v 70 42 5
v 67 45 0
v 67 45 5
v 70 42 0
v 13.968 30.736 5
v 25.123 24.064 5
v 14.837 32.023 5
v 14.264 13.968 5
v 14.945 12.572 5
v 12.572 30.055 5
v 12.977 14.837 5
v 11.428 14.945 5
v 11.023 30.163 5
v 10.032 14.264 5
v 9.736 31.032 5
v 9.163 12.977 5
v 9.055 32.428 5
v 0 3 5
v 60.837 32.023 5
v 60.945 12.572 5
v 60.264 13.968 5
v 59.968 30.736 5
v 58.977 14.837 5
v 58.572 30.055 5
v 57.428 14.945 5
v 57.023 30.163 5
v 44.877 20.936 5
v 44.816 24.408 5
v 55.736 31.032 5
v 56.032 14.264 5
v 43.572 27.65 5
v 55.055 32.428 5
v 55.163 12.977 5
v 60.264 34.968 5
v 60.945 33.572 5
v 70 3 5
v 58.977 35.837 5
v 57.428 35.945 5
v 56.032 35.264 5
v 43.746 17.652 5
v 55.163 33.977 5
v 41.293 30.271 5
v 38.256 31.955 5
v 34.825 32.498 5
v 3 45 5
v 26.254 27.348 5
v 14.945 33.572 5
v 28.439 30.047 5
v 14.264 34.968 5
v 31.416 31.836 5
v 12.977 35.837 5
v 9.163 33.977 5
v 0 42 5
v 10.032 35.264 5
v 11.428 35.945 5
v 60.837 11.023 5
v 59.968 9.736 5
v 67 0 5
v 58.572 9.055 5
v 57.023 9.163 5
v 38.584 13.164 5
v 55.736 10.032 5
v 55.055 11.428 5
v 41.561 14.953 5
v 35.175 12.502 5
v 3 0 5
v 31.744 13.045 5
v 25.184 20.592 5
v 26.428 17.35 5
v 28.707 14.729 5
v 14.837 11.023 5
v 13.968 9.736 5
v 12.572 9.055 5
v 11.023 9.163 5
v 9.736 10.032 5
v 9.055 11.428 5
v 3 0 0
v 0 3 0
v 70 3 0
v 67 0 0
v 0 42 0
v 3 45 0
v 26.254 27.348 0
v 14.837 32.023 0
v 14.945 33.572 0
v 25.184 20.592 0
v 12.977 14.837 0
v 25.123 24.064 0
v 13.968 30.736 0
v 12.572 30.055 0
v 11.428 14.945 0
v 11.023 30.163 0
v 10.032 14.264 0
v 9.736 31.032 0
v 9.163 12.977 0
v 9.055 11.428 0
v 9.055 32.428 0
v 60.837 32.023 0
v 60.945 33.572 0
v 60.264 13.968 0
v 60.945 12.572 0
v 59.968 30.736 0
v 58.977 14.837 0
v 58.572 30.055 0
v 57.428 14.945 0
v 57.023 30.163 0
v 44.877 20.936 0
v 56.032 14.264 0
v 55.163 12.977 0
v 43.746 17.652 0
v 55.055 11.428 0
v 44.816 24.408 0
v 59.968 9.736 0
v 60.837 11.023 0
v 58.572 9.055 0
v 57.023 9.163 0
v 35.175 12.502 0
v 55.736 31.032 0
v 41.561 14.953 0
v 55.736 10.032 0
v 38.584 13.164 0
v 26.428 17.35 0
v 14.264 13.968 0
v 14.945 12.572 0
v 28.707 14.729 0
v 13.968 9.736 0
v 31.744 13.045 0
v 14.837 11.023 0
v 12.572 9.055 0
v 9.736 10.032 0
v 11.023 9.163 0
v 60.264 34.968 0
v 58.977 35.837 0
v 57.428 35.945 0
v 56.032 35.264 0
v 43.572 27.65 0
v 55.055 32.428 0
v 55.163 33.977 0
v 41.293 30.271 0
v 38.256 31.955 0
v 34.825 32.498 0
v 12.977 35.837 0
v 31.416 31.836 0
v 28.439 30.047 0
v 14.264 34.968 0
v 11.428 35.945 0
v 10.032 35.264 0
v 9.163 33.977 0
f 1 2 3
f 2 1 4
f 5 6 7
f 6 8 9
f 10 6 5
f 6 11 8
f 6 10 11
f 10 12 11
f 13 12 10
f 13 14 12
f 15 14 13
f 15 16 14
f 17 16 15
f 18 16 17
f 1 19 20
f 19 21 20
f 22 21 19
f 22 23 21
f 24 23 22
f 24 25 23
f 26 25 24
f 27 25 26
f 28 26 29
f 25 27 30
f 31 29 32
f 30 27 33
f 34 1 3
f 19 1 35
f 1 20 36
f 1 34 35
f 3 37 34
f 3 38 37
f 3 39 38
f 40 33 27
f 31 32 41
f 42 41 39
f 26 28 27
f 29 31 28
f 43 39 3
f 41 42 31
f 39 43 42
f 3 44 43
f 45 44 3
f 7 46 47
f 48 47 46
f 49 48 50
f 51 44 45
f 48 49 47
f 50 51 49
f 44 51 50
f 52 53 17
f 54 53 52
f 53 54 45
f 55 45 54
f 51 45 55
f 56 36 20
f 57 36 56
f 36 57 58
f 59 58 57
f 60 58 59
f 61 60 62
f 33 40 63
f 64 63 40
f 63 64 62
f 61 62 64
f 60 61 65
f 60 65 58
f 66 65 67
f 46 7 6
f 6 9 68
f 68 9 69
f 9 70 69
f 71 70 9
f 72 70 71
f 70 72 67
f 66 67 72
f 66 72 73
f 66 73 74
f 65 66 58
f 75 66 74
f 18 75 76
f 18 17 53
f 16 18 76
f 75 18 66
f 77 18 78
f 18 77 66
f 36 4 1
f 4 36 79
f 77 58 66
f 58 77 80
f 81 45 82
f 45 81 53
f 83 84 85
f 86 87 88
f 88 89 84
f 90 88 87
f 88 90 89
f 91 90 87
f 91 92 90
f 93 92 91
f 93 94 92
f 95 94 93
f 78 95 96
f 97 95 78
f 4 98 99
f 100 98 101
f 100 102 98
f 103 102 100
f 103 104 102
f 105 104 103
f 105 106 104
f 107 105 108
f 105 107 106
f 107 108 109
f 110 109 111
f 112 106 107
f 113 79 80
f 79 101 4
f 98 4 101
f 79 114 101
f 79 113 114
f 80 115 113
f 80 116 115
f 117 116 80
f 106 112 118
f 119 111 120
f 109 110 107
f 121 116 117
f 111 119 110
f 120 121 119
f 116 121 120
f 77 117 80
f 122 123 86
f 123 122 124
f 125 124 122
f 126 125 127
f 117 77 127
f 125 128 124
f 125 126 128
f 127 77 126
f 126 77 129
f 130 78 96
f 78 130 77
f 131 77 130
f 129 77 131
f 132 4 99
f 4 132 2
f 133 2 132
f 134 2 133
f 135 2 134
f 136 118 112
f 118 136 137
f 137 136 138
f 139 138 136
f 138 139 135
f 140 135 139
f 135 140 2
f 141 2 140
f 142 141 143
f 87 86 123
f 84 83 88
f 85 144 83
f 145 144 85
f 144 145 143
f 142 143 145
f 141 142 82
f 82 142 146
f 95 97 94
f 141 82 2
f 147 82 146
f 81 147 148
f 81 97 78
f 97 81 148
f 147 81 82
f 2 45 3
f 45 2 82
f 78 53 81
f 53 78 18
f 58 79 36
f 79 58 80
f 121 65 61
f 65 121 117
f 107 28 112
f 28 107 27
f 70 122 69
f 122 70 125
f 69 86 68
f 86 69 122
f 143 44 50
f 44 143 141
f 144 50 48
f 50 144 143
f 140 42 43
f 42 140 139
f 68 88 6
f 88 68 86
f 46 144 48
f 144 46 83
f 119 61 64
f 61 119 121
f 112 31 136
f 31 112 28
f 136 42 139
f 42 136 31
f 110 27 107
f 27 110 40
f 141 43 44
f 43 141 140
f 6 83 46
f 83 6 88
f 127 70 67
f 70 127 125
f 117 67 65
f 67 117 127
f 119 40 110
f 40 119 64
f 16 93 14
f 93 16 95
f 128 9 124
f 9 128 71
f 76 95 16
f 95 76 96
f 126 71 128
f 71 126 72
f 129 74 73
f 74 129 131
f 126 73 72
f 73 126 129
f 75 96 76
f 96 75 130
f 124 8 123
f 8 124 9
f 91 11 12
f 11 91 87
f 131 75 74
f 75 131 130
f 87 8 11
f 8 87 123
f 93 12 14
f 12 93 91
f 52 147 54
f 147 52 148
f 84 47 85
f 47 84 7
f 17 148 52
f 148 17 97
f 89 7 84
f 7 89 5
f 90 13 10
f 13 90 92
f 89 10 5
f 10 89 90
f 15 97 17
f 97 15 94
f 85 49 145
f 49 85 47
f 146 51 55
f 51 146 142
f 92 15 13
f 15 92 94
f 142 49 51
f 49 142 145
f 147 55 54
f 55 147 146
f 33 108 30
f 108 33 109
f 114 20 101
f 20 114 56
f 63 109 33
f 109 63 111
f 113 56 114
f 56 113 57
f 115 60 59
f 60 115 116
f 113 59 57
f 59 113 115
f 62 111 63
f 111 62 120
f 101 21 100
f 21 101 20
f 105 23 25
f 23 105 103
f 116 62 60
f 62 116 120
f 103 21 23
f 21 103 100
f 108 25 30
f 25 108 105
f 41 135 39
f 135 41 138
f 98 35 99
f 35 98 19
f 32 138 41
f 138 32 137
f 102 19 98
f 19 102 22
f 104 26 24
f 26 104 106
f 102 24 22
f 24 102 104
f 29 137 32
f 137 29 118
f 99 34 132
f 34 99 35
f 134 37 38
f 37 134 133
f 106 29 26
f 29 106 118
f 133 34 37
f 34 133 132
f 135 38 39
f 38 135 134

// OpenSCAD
$fn = 32;

// ----------------------------------------------------------------------
// Spacer plate: rect 70 x 45
// ----------------------------------------------------------------------

// --- parameters (mm) ---
bore_r = 10;              // centre bore radius
bolt_r = 3;               // bolt hole radius
plate_t = 5;              // plate thickness, Z (extrusion height)
plate_l = 70;             // plate length, X
plate_w = 45;             // plate width, Y
inset = 12;               // corner hole inset

profile = [[3, 0], [67, 0], [70, 3], [70, 42], [67, 45], [3, 45], [0, 42], [0, 3]];  // primary outline, 8 points, counter clockwise
void_1 = [[44.816, 24.408], [43.572, 27.65], [41.293, 30.271], [38.256, 31.955], [34.825, 32.498], [31.416, 31.836], [28.439, 30.047], [26.254, 27.348], [25.123, 24.064], [25.184, 20.592], [26.428, 17.35], [28.707, 14.729], [31.744, 13.045], [35.175, 12.502], [38.584, 13.164], [41.561, 14.953], [43.746, 17.652], [44.877, 20.936]];  // centre bore, 18 points
void_2 = [[14.945, 12.572], [14.264, 13.968], [12.977, 14.837], [11.428, 14.945], [10.032, 14.264], [9.163, 12.977], [9.055, 11.428], [9.736, 10.032], [11.023, 9.163], [12.572, 9.055], [13.968, 9.736], [14.837, 11.023]];  // corner hole, 12 points
void_3 = [[14.945, 33.572], [14.264, 34.968], [12.977, 35.837], [11.428, 35.945], [10.032, 35.264], [9.163, 33.977], [9.055, 32.428], [9.736, 31.032], [11.023, 30.163], [12.572, 30.055], [13.968, 30.736], [14.837, 32.023]];  // corner hole, 12 points
void_4 = [[60.945, 12.572], [60.264, 13.968], [58.977, 14.837], [57.428, 14.945], [56.032, 14.264], [55.163, 12.977], [55.055, 11.428], [55.736, 10.032], [57.023, 9.163], [58.572, 9.055], [59.968, 9.736], [60.837, 11.023]];  // corner hole, 12 points
void_5 = [[60.945, 33.572], [60.264, 34.968], [58.977, 35.837], [57.428, 35.945], [56.032, 35.264], [55.163, 33.977], [55.055, 32.428], [55.736, 31.032], [57.023, 30.163], [58.572, 30.055], [59.968, 30.736], [60.837, 32.023]];  // corner hole, 12 points

// --- the one profile operation ---
difference() {
  linear_extrude(height = plate_t) polygon(points = profile);
  translate([0, 0, -1])
    linear_extrude(height = plate_t + 2) polygon(points = void_1);
  translate([0, 0, -1])
    linear_extrude(height = plate_t + 2) polygon(points = void_2);
  translate([0, 0, -1])
    linear_extrude(height = plate_t + 2) polygon(points = void_3);
  translate([0, 0, -1])
    linear_extrude(height = plate_t + 2) polygon(points = void_4);
  translate([0, 0, -1])
    linear_extrude(height = plate_t + 2) polygon(points = void_5);
}
